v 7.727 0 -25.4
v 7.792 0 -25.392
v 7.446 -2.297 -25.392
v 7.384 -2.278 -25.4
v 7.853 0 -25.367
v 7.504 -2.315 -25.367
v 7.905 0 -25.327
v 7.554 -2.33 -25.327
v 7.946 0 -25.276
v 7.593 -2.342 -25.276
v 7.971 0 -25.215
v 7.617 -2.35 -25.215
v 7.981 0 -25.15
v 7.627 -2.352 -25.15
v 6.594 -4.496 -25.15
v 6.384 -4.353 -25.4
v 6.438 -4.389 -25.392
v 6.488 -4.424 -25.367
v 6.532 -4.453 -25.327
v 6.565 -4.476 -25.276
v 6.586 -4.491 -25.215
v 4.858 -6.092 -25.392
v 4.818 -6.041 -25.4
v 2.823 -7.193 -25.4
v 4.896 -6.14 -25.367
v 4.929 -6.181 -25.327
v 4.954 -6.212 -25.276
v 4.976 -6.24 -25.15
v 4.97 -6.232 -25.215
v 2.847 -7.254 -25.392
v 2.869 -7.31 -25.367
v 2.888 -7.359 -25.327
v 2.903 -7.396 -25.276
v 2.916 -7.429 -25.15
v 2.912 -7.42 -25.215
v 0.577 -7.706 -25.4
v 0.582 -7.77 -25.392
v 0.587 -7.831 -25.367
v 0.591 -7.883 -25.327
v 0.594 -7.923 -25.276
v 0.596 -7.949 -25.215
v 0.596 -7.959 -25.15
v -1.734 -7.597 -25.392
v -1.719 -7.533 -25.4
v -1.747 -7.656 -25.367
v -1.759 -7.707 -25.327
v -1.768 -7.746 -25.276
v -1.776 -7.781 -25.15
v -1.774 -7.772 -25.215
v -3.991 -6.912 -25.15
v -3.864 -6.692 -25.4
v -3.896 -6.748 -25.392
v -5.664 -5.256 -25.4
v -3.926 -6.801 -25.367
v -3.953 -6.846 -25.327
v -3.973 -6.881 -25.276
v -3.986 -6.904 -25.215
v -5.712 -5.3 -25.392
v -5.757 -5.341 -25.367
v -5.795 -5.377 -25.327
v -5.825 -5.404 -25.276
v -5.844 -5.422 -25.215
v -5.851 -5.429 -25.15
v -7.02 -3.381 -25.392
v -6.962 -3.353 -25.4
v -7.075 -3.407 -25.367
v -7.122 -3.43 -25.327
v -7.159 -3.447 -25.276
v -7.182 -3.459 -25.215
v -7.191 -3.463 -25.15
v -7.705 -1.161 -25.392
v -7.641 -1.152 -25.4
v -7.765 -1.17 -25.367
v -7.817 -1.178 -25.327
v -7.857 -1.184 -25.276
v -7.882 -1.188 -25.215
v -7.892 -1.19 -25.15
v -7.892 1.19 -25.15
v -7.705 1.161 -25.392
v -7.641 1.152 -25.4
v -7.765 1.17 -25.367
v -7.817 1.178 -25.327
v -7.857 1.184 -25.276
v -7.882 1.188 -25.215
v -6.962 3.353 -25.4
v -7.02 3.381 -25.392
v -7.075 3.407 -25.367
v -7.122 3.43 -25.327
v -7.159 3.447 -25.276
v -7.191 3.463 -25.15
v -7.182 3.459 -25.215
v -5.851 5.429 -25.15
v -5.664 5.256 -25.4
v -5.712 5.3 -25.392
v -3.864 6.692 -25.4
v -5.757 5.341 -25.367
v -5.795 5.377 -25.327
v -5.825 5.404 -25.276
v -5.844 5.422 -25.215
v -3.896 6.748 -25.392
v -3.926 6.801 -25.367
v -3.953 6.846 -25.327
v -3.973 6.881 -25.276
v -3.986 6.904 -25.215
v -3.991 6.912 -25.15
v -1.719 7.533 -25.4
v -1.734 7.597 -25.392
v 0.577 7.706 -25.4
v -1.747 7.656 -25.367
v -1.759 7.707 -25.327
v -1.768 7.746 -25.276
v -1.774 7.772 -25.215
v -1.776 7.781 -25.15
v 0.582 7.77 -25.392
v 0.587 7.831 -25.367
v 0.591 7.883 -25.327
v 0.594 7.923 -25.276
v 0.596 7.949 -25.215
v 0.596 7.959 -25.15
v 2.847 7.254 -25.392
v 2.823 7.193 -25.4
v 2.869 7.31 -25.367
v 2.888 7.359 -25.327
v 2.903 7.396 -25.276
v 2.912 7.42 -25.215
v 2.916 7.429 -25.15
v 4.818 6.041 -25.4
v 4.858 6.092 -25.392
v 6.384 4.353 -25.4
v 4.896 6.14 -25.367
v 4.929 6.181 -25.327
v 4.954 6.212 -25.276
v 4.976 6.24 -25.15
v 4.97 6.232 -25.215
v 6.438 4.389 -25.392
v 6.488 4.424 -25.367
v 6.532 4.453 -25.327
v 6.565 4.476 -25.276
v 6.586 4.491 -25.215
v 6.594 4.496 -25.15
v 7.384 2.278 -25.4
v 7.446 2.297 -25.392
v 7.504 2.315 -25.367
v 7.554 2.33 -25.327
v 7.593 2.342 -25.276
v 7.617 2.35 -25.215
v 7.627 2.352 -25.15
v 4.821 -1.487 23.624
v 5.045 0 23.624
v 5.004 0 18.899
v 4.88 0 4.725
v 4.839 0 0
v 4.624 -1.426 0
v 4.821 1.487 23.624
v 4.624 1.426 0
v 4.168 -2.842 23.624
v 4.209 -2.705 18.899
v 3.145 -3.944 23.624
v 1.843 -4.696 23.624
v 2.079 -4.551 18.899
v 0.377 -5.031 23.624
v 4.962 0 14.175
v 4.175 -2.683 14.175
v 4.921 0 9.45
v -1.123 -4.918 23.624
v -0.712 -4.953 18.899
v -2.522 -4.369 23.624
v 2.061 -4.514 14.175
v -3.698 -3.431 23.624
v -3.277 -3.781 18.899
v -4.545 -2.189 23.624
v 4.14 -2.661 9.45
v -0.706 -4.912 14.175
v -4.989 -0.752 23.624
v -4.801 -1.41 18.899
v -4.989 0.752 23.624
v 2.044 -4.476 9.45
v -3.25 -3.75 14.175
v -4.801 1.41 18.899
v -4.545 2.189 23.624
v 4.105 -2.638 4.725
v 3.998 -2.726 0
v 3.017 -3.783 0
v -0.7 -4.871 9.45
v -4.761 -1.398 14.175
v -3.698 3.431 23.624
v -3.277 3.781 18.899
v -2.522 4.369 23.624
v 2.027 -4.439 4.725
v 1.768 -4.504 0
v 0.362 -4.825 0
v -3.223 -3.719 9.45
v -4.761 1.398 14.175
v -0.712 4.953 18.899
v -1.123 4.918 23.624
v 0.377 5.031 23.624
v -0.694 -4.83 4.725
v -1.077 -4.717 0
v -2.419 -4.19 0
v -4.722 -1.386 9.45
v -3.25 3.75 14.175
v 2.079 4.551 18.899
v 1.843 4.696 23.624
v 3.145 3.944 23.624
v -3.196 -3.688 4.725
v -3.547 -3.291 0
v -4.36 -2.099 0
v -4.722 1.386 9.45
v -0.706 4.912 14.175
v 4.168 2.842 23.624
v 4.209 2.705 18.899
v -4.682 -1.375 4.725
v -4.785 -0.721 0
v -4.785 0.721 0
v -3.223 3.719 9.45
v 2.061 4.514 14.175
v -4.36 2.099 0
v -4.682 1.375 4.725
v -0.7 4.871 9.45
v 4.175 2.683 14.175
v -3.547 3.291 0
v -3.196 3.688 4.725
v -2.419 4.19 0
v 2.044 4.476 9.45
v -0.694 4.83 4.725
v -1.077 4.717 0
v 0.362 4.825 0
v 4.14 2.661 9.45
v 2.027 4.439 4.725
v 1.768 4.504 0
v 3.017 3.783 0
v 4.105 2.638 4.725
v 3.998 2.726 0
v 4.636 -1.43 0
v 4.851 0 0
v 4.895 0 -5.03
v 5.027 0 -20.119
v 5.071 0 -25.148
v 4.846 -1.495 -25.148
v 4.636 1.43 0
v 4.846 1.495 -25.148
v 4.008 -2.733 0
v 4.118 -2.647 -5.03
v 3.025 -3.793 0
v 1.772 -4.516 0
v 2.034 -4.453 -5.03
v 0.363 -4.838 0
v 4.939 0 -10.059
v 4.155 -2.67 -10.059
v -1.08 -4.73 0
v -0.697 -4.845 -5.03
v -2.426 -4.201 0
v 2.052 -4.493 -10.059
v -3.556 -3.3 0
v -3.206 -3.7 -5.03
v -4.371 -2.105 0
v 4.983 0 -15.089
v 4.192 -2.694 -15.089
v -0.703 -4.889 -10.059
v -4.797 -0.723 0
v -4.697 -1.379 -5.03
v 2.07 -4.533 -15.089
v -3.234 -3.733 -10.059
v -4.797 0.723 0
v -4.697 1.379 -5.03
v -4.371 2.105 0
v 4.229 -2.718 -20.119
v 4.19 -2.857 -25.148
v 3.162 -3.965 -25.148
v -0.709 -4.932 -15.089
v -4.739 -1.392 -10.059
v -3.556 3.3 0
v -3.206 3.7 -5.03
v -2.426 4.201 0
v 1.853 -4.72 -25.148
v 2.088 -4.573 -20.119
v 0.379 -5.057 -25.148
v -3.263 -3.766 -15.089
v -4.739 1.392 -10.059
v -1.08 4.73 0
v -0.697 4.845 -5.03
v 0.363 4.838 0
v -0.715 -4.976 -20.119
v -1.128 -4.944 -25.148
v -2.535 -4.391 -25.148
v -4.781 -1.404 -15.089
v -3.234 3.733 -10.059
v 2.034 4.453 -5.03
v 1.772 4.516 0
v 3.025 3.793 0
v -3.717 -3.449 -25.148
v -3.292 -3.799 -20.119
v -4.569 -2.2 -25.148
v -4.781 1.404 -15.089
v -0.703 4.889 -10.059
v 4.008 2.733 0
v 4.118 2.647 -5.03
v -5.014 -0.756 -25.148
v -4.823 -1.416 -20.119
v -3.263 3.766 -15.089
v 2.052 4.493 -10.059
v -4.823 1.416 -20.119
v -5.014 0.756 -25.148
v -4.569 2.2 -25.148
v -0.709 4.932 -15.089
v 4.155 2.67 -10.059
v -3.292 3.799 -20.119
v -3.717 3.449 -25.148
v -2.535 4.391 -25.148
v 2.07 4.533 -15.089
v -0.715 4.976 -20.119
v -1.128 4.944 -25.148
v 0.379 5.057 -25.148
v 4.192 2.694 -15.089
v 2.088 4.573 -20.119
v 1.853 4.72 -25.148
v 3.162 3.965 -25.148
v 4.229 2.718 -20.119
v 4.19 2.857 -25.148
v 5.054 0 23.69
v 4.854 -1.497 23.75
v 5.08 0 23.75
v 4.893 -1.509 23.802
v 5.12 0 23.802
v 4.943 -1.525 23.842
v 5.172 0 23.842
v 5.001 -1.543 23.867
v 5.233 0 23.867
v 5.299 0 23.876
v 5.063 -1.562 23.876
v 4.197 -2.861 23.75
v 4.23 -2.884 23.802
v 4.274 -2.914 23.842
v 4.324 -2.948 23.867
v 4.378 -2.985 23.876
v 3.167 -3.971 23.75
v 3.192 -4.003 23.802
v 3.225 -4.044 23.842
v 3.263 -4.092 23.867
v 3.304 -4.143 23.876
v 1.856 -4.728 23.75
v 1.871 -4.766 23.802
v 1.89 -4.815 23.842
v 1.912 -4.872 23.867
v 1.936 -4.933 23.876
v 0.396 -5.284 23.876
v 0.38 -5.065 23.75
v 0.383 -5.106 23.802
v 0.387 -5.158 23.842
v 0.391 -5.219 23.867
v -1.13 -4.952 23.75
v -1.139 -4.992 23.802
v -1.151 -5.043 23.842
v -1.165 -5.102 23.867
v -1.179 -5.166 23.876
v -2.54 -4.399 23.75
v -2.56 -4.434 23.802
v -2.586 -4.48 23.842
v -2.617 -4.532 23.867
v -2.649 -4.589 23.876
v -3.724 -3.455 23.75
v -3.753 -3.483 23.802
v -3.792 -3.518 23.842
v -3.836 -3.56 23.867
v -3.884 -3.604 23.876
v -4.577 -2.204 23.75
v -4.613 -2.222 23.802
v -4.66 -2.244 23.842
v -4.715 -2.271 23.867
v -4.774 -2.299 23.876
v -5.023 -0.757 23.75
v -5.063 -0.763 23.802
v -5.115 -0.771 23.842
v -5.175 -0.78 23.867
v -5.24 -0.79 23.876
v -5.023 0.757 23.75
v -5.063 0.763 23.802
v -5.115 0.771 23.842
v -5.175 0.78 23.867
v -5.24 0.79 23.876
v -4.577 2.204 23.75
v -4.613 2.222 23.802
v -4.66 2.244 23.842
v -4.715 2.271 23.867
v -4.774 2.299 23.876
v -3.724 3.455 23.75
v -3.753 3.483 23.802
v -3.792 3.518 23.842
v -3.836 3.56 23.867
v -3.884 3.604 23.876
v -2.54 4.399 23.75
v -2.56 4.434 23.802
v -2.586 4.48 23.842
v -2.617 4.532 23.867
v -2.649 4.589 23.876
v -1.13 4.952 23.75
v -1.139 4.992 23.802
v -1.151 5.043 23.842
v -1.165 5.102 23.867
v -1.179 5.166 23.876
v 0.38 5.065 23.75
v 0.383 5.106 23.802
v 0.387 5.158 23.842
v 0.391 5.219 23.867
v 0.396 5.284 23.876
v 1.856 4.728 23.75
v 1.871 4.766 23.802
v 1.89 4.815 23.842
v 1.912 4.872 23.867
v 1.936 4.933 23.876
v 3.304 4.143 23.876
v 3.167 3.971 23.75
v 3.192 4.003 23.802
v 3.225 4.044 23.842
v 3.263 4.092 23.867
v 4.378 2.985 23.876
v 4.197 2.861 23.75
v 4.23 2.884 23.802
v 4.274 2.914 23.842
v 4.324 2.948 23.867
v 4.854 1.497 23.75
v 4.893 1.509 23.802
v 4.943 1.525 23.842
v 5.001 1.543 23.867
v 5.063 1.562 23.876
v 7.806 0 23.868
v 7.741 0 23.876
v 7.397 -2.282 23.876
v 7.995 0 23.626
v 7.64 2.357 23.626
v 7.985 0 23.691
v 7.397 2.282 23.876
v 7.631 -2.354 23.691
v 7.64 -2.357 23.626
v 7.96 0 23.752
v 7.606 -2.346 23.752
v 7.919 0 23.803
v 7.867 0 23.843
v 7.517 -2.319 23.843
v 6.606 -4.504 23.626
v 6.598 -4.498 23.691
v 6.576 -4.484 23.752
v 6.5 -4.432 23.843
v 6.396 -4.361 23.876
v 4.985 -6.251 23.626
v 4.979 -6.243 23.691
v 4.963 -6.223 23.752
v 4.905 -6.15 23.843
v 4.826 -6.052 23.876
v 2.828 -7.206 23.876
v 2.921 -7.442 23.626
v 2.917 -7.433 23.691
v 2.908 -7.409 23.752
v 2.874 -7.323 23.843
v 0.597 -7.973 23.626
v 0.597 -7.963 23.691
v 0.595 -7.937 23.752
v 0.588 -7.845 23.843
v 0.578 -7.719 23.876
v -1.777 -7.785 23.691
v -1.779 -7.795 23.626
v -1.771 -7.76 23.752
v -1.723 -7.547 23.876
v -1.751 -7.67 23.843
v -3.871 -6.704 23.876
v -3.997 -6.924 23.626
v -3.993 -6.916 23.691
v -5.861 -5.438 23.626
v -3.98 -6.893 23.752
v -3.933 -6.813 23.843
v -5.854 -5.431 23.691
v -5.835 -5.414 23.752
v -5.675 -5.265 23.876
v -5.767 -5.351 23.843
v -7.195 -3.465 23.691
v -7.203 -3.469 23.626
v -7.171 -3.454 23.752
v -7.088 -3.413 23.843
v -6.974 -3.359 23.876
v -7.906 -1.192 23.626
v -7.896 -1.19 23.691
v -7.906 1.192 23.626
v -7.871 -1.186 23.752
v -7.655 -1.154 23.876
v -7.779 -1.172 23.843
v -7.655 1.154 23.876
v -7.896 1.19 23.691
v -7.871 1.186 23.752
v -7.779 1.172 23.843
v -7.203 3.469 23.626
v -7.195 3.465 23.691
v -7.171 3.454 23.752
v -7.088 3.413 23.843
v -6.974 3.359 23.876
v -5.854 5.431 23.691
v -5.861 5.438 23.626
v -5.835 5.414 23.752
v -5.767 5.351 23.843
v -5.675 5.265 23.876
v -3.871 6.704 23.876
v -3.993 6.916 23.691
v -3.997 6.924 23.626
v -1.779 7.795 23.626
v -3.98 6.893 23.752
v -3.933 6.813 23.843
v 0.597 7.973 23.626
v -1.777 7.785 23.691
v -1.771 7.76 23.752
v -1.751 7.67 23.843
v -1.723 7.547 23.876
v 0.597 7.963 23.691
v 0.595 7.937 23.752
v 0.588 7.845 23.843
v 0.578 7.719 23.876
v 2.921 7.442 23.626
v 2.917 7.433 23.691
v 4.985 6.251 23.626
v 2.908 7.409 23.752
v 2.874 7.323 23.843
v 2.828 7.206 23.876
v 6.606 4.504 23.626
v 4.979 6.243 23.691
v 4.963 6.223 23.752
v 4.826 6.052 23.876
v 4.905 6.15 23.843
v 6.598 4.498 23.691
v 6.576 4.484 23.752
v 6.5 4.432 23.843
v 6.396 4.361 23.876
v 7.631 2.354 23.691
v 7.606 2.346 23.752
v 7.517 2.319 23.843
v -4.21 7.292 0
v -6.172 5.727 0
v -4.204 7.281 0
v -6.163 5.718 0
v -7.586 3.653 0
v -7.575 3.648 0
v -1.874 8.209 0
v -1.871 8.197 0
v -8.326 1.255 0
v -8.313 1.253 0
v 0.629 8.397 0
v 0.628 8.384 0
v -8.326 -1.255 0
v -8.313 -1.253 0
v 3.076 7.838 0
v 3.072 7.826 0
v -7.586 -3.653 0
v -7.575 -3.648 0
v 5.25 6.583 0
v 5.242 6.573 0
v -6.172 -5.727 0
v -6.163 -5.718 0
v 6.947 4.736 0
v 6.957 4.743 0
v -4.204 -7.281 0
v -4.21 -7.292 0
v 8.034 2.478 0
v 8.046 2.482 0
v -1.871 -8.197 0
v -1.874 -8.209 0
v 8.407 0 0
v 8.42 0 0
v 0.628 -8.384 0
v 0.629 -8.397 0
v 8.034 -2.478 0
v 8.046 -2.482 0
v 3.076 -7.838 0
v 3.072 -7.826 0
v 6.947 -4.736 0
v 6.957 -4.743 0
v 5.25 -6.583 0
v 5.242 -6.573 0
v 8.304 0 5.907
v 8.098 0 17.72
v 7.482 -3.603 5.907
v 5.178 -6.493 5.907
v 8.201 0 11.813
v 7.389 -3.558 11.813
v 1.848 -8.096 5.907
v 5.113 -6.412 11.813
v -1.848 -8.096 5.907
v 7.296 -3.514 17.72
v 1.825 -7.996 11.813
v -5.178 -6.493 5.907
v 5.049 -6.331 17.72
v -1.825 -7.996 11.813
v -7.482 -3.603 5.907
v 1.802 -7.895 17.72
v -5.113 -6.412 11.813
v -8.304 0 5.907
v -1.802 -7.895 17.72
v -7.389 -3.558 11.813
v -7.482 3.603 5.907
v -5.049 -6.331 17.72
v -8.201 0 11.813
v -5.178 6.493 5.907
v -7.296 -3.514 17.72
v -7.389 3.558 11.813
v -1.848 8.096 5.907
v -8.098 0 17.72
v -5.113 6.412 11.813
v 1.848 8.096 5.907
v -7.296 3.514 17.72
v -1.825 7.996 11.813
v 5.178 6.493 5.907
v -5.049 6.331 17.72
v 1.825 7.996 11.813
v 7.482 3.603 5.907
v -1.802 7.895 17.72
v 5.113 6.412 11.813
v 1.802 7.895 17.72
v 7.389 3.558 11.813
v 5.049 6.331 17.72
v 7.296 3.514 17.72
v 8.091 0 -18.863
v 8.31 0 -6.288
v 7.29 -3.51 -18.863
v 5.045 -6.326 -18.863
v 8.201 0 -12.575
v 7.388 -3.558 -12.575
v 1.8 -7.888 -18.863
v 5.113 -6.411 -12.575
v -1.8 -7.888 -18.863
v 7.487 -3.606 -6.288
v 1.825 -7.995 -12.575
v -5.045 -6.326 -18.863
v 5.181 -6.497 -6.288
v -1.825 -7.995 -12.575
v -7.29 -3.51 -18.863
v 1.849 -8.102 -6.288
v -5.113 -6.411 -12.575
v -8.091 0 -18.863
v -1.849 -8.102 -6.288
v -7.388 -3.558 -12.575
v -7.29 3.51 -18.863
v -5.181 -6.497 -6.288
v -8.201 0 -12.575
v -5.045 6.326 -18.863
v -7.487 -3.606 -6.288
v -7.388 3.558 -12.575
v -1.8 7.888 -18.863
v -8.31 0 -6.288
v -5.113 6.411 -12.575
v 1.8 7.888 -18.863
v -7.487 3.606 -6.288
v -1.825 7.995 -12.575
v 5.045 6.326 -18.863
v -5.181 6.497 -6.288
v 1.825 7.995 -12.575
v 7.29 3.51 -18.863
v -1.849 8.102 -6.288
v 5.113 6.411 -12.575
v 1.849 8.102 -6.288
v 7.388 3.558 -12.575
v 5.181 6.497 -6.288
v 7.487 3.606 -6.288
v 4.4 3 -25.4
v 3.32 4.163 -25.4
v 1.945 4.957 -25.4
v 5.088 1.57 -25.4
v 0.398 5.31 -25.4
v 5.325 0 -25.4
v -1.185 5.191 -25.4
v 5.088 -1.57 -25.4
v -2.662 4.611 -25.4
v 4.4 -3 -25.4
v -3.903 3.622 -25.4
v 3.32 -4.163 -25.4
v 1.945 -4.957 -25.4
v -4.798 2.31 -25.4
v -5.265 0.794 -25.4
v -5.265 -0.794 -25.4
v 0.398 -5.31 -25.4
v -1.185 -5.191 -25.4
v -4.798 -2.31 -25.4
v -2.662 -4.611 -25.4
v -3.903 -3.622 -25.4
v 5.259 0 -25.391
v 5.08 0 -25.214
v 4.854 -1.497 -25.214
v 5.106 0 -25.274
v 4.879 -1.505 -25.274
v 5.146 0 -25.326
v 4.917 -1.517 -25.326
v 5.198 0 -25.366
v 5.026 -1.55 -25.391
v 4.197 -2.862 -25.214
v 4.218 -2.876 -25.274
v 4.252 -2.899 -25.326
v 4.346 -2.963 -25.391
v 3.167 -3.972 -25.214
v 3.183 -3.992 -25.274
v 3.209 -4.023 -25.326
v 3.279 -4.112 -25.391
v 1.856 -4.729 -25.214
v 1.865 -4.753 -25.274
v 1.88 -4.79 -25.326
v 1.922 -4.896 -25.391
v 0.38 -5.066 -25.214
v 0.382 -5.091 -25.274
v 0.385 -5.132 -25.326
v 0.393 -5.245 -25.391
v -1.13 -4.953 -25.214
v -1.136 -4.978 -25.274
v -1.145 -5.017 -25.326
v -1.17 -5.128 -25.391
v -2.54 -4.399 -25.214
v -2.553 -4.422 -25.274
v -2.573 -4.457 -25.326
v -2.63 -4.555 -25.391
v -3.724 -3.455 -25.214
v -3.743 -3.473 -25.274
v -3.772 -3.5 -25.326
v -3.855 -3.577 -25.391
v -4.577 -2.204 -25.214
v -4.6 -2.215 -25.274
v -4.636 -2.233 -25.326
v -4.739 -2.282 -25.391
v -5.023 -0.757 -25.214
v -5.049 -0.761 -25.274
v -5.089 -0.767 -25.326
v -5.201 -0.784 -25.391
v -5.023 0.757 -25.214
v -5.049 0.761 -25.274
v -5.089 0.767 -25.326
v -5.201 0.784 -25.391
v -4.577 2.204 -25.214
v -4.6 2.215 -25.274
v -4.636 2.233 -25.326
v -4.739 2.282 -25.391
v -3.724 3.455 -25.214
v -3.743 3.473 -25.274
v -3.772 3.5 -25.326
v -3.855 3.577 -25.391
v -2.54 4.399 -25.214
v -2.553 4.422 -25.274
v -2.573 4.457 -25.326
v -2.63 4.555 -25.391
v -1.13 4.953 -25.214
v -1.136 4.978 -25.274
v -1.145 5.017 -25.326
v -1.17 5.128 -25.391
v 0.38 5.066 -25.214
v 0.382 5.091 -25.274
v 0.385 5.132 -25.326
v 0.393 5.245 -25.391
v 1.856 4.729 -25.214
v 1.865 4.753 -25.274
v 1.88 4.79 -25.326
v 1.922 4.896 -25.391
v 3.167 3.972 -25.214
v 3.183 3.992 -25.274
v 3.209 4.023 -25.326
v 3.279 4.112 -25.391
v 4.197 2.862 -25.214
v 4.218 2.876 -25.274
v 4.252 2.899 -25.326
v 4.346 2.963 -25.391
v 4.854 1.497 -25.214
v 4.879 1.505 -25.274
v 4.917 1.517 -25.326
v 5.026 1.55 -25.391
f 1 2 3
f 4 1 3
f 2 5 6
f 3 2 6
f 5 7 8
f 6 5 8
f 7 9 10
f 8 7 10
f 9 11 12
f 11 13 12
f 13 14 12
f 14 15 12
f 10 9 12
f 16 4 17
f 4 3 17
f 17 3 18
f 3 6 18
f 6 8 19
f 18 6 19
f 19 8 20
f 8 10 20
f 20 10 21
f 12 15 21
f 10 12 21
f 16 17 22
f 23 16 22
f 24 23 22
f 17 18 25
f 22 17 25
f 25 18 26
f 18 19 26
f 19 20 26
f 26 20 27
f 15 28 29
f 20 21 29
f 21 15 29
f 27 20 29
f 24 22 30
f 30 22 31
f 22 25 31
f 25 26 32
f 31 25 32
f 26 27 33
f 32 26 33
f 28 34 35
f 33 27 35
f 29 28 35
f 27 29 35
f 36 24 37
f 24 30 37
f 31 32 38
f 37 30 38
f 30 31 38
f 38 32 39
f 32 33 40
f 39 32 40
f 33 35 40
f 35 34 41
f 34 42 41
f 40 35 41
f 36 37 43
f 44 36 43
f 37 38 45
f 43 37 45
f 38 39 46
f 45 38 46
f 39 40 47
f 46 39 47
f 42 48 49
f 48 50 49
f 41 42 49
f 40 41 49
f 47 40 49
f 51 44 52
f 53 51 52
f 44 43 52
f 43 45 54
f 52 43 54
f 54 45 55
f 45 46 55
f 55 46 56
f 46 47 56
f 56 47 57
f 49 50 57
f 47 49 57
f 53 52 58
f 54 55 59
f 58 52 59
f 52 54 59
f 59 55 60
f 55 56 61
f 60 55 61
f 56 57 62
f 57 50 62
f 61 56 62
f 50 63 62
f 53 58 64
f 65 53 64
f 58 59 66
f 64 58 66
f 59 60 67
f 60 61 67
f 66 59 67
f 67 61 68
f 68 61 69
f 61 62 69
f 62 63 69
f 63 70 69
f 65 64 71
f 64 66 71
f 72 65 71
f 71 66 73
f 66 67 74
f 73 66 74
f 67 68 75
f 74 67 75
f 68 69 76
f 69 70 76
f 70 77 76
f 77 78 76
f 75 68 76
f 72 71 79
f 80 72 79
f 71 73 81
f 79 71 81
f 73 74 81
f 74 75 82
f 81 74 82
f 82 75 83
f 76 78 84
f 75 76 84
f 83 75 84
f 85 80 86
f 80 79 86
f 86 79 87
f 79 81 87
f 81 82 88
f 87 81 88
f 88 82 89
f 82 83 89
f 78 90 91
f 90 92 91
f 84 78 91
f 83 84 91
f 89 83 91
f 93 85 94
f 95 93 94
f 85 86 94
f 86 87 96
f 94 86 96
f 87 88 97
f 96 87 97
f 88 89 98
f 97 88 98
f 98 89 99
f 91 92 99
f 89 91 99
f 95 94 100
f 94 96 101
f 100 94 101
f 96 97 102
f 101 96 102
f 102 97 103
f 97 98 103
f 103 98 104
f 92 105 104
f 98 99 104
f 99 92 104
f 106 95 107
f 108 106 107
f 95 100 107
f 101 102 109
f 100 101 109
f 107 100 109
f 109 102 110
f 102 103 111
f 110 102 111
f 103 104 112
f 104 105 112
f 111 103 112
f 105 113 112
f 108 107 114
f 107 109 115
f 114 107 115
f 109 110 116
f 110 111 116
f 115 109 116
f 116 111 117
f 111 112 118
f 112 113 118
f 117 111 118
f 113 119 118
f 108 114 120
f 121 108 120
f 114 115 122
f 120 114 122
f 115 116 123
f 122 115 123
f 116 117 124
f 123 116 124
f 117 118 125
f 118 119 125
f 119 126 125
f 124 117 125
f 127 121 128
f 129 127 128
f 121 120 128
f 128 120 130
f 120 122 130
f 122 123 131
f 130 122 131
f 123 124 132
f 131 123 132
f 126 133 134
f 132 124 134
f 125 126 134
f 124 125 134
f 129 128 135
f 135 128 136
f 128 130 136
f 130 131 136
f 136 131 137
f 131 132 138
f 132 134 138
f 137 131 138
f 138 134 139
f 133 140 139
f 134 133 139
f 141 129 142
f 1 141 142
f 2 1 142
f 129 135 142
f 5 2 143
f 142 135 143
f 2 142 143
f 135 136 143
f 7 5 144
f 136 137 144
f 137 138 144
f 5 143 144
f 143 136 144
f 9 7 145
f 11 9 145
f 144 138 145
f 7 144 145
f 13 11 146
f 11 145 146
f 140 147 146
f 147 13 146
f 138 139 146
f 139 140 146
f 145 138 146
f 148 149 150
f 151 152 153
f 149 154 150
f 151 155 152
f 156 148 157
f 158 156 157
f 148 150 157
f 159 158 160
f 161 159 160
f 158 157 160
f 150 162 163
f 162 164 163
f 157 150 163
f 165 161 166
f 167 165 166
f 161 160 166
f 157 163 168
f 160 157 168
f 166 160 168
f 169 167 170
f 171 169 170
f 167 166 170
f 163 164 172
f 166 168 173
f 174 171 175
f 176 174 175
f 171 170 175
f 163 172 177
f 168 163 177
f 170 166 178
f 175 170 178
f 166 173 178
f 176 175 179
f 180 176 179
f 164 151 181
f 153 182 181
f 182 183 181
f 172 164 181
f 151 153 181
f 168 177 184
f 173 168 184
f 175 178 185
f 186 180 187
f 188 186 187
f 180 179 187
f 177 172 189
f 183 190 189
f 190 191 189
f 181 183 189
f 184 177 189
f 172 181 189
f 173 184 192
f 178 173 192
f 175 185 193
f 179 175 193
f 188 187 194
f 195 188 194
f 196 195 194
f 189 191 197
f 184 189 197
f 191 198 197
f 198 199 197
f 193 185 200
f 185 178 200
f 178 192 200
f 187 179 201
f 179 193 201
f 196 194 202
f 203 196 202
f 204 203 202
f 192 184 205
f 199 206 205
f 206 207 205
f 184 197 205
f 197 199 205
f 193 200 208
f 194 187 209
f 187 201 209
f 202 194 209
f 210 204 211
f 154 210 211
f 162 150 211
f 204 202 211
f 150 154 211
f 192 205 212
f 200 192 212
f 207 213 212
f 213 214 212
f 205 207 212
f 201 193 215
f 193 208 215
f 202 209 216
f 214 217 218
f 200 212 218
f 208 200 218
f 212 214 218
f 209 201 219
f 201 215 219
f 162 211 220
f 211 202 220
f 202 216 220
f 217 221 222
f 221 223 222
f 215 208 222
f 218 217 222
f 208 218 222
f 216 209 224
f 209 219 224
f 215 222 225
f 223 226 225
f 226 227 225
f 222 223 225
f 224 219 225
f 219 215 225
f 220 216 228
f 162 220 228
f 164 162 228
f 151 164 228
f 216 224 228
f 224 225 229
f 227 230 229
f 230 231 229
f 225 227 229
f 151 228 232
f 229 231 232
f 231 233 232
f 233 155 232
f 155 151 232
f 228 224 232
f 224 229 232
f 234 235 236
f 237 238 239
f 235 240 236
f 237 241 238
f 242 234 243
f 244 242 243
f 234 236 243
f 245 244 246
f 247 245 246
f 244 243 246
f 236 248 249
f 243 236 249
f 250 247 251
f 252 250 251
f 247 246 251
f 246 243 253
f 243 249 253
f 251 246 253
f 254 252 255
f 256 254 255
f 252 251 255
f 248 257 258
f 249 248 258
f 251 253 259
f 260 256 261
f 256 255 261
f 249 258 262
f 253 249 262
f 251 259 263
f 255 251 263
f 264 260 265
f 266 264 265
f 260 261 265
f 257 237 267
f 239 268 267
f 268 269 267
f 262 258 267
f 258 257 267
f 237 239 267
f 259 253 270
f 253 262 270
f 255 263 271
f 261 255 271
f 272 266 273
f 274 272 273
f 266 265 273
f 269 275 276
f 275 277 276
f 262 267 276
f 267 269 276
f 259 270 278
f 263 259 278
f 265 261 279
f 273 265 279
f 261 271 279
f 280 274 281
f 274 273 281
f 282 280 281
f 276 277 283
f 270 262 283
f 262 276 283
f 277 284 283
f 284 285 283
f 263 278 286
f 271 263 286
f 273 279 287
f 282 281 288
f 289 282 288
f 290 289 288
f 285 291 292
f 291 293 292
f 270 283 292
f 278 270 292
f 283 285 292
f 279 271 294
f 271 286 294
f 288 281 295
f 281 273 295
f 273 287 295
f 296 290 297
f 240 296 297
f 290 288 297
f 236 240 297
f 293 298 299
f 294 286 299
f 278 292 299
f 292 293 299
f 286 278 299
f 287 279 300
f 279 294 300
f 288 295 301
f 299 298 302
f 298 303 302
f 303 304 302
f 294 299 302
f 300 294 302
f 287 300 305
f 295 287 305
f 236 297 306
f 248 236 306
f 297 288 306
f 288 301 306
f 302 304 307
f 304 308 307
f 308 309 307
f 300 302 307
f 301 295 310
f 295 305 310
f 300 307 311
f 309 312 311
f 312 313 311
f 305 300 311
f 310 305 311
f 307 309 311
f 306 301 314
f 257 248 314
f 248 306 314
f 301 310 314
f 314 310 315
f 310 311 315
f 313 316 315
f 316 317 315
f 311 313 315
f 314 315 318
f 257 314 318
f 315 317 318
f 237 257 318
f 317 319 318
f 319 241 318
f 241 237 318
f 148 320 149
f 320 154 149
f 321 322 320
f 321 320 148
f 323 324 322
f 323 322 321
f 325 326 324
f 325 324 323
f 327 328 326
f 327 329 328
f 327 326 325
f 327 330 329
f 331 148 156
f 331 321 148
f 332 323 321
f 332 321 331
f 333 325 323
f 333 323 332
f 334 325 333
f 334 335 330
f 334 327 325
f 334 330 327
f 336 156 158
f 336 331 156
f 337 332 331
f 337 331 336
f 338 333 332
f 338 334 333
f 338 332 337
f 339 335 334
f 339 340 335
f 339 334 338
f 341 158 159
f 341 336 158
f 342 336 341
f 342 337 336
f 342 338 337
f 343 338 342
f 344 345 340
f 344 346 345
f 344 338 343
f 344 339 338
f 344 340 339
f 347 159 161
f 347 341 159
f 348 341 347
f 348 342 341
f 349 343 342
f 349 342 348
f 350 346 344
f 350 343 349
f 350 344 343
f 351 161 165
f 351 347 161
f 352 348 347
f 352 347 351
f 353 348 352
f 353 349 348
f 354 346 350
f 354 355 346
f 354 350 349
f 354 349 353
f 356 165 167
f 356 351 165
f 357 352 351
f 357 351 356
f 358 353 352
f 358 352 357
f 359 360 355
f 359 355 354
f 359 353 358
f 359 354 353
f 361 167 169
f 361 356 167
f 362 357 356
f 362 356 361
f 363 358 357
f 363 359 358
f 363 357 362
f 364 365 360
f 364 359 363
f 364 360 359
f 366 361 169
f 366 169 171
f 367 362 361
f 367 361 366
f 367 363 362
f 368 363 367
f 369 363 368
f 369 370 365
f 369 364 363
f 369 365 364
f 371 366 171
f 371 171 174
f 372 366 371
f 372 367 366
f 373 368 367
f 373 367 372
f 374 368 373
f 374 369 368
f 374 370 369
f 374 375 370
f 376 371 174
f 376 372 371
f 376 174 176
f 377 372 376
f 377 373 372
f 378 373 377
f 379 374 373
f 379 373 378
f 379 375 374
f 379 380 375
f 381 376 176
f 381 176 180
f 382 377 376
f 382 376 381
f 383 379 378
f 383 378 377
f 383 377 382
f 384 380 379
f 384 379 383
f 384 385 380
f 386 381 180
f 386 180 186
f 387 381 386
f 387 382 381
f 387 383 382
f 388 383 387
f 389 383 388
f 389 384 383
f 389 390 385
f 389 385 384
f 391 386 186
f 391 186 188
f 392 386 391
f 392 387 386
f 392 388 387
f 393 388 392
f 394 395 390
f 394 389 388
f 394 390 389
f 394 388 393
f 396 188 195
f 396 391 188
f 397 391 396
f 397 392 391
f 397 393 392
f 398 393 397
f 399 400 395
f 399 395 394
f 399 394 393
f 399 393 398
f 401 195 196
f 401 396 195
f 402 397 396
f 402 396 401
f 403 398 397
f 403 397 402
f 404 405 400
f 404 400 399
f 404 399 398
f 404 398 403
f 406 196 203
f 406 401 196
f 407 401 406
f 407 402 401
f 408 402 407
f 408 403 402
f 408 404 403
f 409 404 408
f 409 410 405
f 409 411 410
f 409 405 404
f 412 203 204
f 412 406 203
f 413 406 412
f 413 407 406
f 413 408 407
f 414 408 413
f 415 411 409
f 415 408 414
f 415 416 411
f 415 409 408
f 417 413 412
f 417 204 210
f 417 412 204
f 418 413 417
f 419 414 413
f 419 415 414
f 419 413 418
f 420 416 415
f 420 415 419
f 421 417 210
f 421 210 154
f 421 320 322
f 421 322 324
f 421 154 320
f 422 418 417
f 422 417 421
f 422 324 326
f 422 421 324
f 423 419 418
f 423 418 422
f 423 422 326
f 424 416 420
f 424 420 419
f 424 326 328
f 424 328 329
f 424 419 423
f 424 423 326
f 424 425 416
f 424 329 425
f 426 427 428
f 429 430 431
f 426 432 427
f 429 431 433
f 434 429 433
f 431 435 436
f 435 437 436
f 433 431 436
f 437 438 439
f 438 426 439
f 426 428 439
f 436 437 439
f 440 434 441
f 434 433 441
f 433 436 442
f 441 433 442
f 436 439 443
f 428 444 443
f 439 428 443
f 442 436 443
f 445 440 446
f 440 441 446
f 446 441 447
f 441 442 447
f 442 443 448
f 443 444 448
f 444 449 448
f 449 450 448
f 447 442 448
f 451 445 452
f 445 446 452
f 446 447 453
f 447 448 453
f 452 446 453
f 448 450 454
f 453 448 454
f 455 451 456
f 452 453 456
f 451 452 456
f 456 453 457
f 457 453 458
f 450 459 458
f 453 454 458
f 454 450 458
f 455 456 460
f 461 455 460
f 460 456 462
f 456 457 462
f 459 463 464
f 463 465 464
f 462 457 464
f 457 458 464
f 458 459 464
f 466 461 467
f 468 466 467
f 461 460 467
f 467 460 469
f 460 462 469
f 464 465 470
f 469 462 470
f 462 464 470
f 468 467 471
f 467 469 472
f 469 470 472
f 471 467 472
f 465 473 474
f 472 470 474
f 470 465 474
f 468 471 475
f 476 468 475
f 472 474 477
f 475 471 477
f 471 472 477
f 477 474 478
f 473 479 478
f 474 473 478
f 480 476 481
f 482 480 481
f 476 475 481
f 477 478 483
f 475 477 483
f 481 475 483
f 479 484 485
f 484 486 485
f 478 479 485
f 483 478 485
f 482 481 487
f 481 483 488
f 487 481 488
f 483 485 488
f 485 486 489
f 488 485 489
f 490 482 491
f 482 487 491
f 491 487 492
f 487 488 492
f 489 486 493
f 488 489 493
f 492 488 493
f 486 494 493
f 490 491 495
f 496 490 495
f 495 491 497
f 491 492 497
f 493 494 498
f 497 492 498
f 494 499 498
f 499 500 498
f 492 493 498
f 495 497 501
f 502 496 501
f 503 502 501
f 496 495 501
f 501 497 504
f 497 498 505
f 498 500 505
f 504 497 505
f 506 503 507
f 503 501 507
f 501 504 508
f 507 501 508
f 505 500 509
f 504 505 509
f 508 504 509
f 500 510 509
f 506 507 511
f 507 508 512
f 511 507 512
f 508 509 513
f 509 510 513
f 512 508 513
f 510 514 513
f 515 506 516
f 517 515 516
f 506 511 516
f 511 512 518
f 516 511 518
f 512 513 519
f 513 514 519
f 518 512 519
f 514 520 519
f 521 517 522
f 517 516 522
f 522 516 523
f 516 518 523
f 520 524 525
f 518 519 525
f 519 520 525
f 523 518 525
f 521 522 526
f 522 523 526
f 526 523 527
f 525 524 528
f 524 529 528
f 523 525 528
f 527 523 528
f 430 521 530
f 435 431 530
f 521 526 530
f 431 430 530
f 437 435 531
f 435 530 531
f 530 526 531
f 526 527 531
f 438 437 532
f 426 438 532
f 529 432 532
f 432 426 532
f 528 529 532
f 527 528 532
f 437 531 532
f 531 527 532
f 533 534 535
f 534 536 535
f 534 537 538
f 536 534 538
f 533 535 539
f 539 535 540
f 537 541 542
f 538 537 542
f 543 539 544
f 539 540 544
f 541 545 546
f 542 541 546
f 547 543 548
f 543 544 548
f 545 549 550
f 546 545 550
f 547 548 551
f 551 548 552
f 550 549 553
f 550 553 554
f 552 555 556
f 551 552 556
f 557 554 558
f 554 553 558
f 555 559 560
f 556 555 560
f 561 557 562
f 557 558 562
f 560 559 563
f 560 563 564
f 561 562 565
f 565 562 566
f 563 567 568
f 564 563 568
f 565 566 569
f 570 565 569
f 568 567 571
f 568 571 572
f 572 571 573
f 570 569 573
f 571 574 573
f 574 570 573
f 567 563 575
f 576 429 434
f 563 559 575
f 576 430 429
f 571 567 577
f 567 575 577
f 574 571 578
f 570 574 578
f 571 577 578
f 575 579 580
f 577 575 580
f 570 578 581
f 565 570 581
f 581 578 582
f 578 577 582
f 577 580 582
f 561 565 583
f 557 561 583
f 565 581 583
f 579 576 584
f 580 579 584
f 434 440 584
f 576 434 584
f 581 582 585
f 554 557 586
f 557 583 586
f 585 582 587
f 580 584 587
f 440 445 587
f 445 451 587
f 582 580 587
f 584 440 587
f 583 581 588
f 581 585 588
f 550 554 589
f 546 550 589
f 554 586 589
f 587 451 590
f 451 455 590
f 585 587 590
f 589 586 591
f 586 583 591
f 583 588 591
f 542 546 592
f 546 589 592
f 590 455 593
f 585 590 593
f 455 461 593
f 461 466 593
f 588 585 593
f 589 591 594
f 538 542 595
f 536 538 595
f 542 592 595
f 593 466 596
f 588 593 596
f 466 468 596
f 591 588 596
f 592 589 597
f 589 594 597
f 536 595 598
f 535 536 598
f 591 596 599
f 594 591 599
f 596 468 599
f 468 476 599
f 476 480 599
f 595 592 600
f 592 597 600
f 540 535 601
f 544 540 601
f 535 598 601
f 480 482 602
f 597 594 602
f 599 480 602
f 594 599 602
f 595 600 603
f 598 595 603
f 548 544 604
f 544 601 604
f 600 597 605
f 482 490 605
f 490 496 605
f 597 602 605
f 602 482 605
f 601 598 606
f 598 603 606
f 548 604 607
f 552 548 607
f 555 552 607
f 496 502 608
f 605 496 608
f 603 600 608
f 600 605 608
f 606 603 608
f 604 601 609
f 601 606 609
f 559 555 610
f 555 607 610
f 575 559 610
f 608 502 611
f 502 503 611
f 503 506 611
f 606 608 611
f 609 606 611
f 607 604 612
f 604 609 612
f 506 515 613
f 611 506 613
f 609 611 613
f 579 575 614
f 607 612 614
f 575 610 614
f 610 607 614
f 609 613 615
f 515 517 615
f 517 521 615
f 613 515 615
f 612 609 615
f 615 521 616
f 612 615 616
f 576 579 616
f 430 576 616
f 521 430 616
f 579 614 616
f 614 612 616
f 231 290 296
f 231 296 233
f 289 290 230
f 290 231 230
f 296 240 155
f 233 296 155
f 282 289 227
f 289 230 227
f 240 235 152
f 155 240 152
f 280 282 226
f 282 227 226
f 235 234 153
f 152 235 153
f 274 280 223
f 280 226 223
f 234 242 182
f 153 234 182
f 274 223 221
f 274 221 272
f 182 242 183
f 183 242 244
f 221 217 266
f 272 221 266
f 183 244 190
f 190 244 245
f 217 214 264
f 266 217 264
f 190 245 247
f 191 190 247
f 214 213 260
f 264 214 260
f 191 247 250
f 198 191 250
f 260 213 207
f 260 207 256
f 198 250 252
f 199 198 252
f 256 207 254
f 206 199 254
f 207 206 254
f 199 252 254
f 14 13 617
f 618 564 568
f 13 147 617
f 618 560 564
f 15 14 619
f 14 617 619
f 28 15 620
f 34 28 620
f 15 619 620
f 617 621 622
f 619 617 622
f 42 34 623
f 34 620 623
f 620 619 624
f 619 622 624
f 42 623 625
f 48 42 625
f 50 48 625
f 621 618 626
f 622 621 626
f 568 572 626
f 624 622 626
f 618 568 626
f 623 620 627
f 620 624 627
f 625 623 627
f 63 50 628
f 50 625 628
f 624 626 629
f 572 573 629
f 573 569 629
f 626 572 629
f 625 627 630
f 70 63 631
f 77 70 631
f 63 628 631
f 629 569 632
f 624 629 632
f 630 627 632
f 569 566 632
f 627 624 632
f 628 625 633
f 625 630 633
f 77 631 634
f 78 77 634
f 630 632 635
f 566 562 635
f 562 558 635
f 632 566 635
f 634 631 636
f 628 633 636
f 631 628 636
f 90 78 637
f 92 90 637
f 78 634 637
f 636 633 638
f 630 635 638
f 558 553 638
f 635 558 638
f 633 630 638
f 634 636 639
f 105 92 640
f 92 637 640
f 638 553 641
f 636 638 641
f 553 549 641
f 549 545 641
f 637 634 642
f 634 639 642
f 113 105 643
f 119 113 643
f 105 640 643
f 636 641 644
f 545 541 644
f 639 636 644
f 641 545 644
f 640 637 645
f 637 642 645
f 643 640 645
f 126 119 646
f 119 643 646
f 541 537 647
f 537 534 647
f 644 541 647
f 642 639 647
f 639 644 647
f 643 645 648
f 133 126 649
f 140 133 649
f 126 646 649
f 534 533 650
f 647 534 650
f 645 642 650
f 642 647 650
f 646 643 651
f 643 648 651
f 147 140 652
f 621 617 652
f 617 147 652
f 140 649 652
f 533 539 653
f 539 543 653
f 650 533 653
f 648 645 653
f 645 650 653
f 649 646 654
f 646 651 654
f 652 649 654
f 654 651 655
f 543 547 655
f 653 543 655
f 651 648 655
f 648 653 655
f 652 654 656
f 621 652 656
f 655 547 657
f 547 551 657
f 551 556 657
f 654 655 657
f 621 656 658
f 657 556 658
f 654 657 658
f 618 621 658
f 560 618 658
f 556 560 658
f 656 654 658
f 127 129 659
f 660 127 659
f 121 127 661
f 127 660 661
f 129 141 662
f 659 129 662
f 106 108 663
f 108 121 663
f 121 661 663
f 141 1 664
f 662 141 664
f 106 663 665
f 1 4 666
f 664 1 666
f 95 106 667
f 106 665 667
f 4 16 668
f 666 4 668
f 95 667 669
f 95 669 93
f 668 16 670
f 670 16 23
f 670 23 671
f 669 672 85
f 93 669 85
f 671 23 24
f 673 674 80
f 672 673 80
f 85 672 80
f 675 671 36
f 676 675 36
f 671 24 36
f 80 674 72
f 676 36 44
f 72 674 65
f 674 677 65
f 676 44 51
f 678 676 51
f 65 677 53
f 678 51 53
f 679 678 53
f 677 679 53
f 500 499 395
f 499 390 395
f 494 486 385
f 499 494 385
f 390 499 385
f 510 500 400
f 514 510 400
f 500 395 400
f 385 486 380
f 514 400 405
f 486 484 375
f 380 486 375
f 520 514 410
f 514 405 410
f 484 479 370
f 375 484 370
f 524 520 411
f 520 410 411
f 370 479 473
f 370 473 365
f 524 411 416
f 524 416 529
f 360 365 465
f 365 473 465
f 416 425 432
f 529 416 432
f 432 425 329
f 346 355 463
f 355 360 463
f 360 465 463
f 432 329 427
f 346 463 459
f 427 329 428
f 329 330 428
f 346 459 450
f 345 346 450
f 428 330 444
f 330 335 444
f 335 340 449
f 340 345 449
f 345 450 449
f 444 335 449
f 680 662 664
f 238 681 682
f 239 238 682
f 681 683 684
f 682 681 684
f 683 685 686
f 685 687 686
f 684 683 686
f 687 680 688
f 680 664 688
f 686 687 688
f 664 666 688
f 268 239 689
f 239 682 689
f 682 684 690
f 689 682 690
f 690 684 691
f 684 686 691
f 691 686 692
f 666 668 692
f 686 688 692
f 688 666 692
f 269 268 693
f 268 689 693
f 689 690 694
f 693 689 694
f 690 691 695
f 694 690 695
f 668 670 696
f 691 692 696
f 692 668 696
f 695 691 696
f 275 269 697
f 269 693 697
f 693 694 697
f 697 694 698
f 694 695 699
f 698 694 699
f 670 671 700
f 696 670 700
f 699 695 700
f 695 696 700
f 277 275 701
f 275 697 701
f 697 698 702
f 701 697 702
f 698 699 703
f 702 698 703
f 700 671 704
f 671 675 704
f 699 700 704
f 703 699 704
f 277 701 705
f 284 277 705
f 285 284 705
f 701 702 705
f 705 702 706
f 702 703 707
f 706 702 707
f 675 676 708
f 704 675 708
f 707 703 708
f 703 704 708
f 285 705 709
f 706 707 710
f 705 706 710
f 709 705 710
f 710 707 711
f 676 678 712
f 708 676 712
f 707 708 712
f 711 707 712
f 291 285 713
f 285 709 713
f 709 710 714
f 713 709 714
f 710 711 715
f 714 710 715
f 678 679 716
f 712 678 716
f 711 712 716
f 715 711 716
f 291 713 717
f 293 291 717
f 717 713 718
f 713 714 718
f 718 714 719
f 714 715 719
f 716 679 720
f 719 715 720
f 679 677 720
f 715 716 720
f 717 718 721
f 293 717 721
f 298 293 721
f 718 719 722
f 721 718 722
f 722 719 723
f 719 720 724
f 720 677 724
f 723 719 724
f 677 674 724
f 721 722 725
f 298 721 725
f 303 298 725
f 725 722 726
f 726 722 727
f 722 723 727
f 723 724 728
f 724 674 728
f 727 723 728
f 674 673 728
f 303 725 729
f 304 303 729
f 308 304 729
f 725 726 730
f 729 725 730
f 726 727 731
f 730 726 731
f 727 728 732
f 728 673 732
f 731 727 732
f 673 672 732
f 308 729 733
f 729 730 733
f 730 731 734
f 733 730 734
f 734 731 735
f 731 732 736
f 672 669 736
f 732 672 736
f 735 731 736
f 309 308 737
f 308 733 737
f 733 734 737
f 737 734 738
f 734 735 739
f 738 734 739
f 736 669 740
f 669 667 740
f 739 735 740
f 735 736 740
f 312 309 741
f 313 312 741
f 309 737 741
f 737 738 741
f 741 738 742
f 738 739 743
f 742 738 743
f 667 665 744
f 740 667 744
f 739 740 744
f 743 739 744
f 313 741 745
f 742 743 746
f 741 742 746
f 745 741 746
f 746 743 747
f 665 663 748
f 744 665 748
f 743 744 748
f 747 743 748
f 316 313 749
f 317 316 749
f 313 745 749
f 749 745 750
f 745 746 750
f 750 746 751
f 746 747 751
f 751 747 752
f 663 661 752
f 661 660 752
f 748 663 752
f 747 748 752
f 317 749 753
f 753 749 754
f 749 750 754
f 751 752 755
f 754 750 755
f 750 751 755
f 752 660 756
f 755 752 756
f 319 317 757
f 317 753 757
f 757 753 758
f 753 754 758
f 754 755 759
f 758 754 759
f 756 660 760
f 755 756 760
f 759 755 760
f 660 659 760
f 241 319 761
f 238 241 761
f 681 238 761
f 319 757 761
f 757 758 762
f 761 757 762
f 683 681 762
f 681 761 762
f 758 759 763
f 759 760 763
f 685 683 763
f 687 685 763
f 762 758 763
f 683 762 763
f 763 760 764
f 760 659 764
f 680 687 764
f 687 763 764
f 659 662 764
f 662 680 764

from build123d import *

# Parameters (mm, degrees)
FILLET1_R = 0.254


with BuildPart() as part:
    # Sketch1 → Revolve1 (revolve)
    with BuildSketch(Plane.XZ):
        Polygon((5.047062695, 23.876), (4.8387, 0), (4.8514, 0), (5.073062442, -25.4), (7.976741351, -25.4), (8.4201, 0), (8.4074, 0), (7.99064287, 23.876), align=None)
    revolve(axis=Axis((0, 0, 23.867968573), (0, 0, -1)))

    # Fillet1
    fillet1_edges = [part.edges().sort_by_distance(p)[0] for p in [
        (-7.99064287, 0, 23.876),
        (-7.976741351, 0, -25.4),
        (-5.073062442, 0, -25.4),
        (-5.047062695, 0, 23.876),
    ]]
    fillet(fillet1_edges, radius=FILLET1_R)


solid = part.part
